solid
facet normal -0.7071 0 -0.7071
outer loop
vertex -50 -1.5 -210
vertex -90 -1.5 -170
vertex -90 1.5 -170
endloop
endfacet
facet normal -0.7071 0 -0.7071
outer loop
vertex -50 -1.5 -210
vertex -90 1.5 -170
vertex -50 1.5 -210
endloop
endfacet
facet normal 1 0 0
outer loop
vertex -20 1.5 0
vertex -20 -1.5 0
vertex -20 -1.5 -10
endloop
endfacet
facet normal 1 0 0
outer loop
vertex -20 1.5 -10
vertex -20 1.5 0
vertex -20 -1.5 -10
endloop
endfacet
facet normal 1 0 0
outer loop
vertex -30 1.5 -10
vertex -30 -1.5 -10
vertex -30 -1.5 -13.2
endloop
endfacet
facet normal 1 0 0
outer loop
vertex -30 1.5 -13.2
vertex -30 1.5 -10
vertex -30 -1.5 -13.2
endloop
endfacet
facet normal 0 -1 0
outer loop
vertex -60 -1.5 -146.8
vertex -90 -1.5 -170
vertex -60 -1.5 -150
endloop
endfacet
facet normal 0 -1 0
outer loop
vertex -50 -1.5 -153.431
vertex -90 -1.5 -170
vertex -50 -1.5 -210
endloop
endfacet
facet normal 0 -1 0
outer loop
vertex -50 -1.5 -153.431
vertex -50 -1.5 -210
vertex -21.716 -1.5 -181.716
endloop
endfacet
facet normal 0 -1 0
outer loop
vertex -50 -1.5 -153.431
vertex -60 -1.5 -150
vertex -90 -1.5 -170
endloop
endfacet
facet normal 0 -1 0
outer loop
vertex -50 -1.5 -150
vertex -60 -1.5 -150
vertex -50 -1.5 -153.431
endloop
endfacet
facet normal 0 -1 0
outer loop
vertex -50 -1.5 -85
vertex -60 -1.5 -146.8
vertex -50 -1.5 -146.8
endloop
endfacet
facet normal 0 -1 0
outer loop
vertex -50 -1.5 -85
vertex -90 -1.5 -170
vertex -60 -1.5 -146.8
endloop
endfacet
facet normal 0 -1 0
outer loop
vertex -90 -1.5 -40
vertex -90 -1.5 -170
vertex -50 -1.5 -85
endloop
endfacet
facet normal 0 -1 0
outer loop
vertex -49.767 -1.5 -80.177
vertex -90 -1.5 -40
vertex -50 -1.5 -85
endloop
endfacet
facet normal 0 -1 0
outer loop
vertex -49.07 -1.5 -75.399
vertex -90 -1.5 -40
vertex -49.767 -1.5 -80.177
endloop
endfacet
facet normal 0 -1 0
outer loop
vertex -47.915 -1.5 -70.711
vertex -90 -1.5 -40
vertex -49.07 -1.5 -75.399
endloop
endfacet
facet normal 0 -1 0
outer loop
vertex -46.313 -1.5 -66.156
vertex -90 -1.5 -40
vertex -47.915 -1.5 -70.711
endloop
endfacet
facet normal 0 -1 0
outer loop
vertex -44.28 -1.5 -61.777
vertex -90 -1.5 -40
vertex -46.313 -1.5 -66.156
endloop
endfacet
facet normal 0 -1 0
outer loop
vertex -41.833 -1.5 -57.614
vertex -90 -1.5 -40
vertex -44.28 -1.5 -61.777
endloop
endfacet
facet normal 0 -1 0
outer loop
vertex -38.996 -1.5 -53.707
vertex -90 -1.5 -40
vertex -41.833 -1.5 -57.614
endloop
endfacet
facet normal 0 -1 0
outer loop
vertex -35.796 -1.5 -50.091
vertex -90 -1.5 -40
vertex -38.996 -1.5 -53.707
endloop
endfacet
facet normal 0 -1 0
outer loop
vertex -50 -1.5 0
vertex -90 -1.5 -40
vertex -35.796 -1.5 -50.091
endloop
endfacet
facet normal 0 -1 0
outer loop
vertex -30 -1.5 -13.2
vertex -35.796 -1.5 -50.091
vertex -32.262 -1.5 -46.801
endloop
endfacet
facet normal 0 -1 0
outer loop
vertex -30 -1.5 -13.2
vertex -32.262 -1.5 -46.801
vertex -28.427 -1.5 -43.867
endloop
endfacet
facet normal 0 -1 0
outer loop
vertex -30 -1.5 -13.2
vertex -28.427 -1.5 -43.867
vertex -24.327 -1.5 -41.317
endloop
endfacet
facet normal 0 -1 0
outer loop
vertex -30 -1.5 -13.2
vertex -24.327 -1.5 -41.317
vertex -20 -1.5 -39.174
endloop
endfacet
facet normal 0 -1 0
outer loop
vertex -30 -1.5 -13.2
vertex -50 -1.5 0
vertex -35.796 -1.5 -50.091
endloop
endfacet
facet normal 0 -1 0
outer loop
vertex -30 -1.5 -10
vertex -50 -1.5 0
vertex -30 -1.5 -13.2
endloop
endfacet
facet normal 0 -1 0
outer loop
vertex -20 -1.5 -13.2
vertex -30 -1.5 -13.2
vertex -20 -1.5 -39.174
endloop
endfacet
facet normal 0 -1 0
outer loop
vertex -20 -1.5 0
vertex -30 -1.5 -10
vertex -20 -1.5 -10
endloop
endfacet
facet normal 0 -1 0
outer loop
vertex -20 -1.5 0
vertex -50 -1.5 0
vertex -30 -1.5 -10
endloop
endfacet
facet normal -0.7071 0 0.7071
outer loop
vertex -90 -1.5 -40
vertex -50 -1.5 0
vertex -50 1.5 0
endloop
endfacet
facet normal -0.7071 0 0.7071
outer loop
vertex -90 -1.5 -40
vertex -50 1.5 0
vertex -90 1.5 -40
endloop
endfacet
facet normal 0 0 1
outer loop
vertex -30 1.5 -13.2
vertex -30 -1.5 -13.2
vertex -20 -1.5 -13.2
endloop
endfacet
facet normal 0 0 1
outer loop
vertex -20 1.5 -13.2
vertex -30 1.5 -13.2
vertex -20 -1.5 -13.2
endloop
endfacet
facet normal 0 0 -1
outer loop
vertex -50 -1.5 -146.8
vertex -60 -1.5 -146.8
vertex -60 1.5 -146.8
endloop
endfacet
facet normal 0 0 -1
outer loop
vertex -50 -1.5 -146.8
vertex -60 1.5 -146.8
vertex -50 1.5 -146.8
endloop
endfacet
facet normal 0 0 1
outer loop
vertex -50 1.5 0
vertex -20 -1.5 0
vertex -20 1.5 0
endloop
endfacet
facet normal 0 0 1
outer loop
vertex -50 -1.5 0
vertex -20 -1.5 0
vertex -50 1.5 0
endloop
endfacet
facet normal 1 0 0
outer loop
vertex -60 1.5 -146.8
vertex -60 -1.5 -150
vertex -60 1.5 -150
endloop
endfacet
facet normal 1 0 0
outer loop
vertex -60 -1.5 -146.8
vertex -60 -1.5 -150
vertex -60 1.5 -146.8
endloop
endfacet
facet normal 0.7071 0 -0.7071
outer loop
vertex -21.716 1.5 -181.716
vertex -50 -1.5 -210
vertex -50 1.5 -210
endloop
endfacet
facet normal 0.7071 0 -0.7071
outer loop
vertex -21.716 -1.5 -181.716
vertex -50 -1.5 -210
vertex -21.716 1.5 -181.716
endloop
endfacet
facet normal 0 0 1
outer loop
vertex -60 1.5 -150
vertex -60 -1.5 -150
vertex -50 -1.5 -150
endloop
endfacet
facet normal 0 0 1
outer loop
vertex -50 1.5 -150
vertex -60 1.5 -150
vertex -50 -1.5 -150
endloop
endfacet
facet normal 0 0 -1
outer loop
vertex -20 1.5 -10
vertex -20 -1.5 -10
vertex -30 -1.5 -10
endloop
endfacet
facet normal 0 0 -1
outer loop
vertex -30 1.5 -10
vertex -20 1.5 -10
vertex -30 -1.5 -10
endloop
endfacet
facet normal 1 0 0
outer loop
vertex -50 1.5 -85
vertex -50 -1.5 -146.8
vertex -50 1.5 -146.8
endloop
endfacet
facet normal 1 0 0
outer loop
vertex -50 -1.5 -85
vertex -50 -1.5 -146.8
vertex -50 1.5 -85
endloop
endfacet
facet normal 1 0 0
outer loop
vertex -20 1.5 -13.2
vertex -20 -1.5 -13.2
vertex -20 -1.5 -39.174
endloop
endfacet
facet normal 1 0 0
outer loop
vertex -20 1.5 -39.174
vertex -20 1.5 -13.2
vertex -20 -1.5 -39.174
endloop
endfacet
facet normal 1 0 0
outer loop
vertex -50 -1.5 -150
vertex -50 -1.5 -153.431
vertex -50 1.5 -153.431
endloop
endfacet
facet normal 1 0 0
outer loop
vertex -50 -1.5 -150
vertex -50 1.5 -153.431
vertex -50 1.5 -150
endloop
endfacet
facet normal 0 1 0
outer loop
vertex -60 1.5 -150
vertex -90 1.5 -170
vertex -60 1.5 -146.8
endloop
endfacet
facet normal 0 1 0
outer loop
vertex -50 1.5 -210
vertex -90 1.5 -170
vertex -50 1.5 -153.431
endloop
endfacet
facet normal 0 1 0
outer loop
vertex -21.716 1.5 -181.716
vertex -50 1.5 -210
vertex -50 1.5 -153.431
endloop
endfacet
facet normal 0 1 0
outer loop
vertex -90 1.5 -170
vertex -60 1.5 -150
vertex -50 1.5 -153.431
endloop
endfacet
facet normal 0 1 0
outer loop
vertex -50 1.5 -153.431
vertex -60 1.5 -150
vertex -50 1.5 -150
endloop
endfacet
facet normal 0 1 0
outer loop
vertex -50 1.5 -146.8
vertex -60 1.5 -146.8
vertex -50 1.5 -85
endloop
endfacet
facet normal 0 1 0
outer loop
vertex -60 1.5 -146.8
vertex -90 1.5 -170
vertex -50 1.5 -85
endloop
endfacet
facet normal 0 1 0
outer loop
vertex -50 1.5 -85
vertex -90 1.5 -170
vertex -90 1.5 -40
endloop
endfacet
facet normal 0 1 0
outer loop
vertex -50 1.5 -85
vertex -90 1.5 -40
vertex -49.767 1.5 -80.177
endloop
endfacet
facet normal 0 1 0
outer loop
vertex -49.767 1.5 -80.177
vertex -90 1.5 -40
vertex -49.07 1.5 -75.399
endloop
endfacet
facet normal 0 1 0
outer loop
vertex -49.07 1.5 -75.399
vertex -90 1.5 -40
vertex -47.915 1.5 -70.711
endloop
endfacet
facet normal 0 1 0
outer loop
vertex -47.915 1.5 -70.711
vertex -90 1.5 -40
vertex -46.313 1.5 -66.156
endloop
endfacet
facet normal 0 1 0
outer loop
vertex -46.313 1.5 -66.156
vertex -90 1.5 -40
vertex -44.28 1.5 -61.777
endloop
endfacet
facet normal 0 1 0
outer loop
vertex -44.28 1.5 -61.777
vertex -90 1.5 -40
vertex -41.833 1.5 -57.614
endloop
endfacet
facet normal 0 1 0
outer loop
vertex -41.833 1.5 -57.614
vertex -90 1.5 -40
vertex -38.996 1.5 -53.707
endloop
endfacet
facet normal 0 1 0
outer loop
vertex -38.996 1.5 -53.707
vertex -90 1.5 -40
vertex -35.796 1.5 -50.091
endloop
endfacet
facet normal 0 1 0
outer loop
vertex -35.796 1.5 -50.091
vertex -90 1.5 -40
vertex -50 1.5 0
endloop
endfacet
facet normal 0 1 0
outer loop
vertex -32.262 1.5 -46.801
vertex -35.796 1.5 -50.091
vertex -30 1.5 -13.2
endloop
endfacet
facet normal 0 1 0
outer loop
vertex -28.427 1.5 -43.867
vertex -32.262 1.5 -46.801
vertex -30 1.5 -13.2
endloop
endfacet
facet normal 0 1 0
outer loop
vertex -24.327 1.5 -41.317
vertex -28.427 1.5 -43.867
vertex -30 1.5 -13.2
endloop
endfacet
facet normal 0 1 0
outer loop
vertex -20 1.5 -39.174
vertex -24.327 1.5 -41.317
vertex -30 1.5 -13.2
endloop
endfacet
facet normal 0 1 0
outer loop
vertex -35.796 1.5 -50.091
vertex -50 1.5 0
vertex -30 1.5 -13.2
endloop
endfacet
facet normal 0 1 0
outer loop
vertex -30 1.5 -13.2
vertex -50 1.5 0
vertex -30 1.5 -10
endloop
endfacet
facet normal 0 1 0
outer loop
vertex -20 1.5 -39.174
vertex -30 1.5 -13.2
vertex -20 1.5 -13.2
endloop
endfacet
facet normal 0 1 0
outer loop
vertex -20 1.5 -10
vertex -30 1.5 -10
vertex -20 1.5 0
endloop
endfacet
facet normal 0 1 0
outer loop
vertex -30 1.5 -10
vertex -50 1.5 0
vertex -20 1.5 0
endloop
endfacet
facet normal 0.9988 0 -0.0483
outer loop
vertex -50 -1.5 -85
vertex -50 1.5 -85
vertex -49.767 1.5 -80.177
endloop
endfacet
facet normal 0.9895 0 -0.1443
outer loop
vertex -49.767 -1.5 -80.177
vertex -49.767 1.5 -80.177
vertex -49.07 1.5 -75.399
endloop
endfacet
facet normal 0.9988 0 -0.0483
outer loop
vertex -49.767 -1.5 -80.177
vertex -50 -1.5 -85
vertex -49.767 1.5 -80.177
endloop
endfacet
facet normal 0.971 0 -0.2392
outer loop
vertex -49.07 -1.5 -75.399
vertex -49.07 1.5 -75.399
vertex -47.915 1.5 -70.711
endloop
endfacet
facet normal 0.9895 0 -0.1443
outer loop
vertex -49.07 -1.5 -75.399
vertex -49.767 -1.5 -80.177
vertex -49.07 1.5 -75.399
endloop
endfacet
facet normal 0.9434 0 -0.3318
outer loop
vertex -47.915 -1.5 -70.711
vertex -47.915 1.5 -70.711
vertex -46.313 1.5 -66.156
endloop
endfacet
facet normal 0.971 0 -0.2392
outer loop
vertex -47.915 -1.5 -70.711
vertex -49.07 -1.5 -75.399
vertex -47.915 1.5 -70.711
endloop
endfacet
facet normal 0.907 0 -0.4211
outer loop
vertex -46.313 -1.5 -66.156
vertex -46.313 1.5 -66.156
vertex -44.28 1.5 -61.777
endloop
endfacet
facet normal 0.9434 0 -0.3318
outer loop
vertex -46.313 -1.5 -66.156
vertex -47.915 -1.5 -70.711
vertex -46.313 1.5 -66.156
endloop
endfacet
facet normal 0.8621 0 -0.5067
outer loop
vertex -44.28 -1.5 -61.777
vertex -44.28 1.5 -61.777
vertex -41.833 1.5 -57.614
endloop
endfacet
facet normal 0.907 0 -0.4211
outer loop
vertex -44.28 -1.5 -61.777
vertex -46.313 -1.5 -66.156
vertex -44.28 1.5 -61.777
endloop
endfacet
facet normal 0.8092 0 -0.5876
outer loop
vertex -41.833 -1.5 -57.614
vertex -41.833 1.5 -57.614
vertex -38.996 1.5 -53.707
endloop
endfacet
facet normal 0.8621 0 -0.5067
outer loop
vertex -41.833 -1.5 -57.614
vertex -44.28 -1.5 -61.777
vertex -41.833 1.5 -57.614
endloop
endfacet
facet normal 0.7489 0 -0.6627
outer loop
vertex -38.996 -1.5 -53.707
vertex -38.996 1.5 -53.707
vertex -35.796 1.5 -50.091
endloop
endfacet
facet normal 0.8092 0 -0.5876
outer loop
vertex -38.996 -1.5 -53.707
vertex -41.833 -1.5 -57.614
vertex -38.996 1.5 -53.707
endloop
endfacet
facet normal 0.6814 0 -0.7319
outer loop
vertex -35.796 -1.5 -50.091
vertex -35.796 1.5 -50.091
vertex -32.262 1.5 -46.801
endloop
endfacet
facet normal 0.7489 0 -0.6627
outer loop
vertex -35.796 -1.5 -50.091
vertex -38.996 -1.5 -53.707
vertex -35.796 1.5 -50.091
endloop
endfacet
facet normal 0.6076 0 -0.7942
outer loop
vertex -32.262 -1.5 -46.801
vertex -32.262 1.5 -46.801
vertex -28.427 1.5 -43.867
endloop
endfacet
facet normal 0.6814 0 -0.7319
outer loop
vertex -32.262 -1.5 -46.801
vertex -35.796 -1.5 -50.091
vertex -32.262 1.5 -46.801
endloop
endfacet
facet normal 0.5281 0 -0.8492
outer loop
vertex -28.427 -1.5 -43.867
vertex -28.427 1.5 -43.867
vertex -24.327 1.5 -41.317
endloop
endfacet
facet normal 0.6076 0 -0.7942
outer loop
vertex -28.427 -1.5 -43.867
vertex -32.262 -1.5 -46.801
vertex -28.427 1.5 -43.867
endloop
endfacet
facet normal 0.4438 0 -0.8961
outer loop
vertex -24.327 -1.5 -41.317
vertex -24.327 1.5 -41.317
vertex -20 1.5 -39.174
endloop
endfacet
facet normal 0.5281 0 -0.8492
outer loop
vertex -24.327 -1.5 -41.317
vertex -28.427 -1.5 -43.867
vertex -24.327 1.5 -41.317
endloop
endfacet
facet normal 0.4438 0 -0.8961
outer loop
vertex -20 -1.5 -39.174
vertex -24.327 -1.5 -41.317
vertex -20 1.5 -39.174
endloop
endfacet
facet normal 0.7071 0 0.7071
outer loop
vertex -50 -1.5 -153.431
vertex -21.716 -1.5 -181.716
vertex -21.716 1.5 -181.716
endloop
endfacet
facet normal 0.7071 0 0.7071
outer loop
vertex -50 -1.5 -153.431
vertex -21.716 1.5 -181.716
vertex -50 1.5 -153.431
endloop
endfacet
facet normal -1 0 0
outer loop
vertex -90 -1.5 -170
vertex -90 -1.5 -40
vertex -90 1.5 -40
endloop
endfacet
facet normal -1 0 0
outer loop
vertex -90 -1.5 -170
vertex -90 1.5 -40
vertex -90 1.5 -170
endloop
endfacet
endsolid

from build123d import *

# Parameters (mm, degrees)
F1_DEPTH = 1.5
F2_W     = 10
F2_H     = 3.2
F3_DEPTH = 3.001


with BuildPart() as f1:
    # F0 (on Front) → F1 (new body, symmetric)
    with BuildSketch(Plane.XZ):
        with BuildLine():
            Line((0, -35), (0, 0))
            Line((0, 0), (-50, 0))
            Line((-50, 0), (-90, -40))
            Line((-90, -40), (-90, -170))
            Line((-90, -170), (-50, -210))
            Line((-50, -210), (-21.715729, -181.715729))
            Line((-21.715729, -181.715729), (-50, -153.431458))
            Line((-50, -153.431458), (-50, -85))
            ThreePointArc((-50, -85), (-35.355339, -49.644661), (0, -35))
        make_face()
    extrude(amount=F1_DEPTH, both=True)

    # F2 (on face) → F3 (cut, through all)
    with BuildSketch(Plane.XZ.offset(1.5)):
        with BuildLine():
            Line((0, 0), (-20, 0))
            Line((-20, 0), (-20, -10))
            Line((-20, -10), (-30, -10))
            Line((-30, -10), (-30, -13.2))
            Line((-30, -13.2), (-20, -13.2))
            Line((-20, -13.2), (-20, -39.174243))
            ThreePointArc((-20, -39.174243), (-10.215482, -36.054684), (0, -35))
            Line((0, -35), (0, 0))
        make_face()
        with Locations((-55, -148.4)):
            Rectangle(F2_W, F2_H)
    extrude(amount=-F3_DEPTH, mode=Mode.SUBTRACT)


solid = f1.part
